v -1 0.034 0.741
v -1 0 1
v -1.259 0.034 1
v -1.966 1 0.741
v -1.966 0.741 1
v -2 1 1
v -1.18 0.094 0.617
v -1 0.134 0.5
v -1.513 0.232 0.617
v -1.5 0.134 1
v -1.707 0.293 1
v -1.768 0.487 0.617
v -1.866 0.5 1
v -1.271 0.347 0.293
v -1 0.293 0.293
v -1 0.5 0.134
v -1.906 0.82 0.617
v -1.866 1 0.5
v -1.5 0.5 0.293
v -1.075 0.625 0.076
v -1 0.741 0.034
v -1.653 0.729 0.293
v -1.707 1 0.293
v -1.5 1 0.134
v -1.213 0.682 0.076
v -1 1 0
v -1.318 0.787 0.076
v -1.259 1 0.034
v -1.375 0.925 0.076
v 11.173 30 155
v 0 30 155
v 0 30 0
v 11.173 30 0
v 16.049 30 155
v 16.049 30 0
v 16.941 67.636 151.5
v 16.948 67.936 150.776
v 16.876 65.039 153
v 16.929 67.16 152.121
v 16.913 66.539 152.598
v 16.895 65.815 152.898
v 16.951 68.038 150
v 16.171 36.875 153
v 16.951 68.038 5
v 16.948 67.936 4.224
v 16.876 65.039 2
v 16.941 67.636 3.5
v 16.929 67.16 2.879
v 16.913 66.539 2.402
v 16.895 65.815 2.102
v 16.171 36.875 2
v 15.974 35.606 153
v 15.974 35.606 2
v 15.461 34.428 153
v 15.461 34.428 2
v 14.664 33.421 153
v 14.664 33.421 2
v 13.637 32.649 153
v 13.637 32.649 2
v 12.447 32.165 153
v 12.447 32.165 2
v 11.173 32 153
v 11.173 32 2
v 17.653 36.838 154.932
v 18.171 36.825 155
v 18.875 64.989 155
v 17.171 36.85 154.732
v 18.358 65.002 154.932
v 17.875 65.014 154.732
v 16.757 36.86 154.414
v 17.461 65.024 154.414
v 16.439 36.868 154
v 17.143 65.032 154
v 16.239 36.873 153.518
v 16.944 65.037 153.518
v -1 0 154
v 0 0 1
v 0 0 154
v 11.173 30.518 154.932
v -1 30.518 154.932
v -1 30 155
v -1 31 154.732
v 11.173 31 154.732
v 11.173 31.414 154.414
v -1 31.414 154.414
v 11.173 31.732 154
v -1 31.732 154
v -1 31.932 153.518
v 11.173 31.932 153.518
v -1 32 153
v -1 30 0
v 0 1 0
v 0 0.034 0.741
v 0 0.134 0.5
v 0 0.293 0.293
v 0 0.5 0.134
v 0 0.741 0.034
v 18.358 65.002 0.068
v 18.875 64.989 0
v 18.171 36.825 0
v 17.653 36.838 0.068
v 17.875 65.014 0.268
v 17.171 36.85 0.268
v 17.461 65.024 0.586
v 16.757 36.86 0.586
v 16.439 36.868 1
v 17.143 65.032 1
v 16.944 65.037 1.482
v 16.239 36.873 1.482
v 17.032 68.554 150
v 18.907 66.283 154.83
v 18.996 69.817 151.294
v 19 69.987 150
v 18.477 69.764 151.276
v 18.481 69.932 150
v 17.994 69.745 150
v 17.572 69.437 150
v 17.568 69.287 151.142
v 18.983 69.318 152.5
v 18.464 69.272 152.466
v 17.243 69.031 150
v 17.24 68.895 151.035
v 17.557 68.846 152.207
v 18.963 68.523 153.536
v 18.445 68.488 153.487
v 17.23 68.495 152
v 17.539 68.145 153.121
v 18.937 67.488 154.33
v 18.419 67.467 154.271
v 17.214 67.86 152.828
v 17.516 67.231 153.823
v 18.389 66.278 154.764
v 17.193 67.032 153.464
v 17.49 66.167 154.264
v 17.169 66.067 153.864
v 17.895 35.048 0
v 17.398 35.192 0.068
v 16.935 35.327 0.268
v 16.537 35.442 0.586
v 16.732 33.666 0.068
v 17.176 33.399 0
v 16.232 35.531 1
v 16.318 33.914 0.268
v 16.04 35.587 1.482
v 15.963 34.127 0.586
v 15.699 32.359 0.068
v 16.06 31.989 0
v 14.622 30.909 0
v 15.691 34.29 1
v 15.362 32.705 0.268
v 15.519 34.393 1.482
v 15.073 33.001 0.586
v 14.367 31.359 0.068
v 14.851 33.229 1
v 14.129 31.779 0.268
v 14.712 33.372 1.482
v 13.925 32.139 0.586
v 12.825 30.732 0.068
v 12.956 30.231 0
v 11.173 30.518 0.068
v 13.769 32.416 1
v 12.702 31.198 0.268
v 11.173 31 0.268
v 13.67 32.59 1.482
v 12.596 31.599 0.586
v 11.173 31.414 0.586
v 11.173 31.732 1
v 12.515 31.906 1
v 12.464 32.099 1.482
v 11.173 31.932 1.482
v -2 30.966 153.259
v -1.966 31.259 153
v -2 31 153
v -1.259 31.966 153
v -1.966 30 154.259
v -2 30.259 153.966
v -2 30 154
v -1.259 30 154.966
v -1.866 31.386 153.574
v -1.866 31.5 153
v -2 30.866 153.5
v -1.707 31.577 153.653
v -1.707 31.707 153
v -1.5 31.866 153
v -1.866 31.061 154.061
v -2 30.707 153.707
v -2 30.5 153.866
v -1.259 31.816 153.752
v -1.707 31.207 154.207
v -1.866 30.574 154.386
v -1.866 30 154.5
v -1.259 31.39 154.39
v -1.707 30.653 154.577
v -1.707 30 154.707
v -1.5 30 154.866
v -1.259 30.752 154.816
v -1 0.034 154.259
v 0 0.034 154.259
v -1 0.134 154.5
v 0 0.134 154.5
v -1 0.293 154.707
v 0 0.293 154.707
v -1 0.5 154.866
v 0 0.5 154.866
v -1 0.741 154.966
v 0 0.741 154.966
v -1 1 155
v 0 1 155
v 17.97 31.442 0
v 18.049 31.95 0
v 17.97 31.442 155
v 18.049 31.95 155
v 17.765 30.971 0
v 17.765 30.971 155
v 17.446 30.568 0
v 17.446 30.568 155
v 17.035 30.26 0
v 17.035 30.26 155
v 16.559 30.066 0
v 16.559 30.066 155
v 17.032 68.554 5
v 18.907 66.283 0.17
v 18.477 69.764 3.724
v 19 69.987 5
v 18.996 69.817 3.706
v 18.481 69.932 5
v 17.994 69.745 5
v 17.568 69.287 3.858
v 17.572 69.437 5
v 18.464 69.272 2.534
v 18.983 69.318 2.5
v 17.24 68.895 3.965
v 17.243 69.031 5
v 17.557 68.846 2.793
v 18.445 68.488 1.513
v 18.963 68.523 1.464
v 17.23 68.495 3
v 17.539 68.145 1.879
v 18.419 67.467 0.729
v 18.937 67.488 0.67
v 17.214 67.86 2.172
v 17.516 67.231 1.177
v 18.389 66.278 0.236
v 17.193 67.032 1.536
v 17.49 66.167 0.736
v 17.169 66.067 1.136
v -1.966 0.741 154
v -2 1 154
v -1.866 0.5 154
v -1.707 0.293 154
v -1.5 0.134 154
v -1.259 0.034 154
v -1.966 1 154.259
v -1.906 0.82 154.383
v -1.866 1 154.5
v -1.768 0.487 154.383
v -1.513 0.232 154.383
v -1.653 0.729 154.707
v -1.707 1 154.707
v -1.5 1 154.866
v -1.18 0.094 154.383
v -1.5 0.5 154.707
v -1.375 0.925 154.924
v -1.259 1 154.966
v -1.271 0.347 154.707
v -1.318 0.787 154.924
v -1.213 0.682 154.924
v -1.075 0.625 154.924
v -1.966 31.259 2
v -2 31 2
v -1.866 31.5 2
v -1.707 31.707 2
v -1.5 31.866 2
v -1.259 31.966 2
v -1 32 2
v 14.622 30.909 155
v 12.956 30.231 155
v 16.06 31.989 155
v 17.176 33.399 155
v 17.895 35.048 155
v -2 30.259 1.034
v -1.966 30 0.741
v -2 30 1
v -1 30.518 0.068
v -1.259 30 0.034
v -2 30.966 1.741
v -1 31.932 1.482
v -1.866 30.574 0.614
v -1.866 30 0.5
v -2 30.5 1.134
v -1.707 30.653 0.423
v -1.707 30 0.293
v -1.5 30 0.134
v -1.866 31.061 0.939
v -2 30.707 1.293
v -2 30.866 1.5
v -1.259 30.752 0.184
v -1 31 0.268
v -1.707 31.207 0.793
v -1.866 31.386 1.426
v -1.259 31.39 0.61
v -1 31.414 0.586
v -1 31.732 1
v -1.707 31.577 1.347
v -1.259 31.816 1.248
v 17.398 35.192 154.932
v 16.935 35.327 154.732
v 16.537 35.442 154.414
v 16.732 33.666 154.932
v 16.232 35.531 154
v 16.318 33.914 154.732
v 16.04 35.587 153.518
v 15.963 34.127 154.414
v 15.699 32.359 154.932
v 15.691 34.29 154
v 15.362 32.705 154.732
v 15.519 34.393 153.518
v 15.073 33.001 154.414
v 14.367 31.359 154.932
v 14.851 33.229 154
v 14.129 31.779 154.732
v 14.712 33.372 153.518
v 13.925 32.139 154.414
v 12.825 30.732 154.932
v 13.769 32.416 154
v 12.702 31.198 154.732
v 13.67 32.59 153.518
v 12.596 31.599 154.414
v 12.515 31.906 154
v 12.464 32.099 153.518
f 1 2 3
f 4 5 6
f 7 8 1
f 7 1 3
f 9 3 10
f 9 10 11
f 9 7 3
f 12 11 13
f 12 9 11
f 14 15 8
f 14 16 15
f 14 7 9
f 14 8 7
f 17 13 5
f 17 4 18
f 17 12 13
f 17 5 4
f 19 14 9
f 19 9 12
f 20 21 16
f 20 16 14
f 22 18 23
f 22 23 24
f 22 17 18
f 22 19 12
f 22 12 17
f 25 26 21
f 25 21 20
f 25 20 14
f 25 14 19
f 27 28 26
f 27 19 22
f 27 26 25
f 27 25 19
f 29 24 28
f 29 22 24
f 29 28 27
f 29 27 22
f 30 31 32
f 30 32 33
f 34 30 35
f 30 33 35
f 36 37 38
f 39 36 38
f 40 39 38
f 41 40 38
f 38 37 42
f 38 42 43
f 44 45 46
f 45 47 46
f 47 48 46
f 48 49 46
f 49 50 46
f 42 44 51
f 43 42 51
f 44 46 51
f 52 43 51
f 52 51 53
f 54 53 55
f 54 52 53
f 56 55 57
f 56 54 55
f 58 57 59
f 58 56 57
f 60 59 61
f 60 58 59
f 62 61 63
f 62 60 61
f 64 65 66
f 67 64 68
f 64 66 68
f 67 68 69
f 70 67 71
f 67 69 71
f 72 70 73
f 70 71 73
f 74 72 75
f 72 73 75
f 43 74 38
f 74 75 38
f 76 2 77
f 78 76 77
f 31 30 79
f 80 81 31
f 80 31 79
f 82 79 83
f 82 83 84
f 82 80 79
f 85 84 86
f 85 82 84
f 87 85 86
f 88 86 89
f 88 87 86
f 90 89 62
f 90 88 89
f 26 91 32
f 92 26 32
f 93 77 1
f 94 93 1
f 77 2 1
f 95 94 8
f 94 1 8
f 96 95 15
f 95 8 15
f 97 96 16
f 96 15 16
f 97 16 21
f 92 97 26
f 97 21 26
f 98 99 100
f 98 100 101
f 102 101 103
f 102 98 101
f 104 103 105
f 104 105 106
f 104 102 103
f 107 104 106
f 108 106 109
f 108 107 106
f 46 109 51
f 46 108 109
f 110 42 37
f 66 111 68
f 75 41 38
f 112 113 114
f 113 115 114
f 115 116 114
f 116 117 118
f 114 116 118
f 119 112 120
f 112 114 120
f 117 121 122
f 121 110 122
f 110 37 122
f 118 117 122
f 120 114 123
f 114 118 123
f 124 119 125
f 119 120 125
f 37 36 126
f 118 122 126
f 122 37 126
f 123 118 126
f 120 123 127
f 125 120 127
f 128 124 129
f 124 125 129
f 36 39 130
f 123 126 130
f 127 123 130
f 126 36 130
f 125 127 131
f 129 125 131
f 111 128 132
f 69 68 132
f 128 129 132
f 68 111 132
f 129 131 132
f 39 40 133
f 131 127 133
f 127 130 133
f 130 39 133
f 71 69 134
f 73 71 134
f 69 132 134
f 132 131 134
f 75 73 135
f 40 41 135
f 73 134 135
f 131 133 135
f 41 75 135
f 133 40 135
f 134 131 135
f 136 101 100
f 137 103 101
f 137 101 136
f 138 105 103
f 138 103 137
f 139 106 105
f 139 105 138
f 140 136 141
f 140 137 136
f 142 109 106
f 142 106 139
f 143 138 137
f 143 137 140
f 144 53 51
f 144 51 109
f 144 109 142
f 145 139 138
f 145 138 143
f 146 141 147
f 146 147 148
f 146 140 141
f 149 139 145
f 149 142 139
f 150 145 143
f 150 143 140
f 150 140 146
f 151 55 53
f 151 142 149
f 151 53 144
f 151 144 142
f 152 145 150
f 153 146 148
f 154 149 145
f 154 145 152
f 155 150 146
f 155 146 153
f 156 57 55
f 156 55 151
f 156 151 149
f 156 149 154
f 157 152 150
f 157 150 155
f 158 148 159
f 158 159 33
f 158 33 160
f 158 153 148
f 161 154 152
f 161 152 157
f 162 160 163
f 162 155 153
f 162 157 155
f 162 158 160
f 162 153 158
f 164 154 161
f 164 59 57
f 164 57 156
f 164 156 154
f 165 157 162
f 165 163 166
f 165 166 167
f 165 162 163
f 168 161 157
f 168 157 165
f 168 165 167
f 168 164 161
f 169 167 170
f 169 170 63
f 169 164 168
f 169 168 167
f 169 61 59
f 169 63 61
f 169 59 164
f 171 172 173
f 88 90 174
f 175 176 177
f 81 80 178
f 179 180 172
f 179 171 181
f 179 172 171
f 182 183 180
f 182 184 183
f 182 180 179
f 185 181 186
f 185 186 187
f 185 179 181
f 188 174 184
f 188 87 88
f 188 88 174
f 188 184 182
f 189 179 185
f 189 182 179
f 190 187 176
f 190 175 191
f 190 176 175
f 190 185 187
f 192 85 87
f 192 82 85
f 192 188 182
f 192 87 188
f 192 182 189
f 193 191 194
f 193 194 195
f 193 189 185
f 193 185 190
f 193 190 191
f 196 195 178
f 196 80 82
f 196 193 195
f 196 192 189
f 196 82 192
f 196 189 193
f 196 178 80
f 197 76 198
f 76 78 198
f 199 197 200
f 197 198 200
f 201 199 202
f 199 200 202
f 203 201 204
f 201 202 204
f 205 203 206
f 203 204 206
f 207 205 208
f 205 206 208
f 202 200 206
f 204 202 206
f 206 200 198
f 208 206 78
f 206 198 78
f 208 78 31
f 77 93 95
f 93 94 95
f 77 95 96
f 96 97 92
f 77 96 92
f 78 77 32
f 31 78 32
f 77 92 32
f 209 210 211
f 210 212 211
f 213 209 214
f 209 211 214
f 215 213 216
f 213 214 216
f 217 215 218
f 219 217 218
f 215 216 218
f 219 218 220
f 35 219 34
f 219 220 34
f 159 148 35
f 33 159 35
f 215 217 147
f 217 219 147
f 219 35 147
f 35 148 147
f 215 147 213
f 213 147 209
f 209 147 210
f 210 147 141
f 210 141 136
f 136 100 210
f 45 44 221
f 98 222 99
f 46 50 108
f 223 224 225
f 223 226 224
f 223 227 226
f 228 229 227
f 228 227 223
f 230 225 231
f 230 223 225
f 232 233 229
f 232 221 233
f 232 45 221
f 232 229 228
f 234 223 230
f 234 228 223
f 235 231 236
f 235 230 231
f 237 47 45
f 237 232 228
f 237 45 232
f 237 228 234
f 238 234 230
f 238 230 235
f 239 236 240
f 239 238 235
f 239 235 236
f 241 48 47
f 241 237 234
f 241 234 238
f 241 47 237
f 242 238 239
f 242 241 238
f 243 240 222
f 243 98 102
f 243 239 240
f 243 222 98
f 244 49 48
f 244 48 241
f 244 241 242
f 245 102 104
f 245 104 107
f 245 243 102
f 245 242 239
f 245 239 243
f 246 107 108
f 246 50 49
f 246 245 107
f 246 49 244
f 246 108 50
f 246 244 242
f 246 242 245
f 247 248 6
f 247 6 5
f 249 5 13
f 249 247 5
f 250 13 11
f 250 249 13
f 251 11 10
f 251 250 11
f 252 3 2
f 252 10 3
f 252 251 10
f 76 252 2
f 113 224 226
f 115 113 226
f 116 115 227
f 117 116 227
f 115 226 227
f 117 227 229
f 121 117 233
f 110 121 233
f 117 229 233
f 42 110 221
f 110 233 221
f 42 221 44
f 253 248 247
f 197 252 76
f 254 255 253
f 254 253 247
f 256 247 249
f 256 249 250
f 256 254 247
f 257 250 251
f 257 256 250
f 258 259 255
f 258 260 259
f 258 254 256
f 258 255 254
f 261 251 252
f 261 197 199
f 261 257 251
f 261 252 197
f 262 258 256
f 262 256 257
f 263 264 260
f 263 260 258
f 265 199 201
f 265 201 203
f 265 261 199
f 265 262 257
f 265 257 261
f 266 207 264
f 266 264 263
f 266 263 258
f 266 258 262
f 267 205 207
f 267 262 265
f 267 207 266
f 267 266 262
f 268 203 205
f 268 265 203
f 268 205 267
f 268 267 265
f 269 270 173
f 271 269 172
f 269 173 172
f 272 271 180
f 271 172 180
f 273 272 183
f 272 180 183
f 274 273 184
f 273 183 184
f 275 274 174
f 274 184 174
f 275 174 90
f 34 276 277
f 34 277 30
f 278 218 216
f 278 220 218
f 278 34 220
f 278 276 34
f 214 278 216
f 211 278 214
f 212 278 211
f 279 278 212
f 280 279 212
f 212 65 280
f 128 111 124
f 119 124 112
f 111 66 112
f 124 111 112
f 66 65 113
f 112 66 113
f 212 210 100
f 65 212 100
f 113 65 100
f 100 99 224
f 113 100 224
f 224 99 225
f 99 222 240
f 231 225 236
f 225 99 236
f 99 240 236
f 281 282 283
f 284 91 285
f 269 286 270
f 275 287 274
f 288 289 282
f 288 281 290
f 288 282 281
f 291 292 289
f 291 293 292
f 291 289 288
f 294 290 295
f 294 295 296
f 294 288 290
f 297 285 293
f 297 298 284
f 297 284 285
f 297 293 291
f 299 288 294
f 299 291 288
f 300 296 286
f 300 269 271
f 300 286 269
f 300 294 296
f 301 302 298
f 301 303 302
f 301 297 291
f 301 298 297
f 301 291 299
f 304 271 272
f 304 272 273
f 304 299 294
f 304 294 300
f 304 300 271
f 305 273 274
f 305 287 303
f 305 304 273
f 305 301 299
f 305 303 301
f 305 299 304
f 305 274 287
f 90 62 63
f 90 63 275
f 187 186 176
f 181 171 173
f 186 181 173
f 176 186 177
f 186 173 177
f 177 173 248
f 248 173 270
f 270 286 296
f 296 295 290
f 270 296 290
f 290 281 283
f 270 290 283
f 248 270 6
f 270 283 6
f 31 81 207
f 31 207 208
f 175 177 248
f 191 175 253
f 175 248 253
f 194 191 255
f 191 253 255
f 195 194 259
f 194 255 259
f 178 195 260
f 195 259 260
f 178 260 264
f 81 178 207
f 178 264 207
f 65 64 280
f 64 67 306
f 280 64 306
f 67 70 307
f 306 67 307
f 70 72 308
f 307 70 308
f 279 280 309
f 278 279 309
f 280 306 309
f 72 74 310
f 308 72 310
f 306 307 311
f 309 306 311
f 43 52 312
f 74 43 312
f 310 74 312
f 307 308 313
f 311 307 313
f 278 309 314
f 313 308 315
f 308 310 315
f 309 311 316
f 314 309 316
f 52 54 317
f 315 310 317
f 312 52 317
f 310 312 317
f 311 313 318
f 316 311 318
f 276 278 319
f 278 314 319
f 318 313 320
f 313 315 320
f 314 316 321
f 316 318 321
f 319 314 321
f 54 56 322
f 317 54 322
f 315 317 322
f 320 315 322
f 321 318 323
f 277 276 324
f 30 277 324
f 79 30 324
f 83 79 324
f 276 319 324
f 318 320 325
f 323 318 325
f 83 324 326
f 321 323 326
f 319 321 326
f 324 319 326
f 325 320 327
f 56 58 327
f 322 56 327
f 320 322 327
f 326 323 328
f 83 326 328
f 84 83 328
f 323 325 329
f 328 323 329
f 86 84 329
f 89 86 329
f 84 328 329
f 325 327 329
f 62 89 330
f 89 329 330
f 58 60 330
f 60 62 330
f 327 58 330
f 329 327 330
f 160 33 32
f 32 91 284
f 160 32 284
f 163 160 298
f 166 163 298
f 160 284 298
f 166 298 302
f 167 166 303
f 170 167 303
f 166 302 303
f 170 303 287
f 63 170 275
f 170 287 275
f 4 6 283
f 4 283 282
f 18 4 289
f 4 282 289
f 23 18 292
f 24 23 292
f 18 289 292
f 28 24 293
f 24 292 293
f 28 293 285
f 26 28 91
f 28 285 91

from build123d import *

# Parameters (mm, degrees)
F1_DEPTH     = 155
F2_R         = 5
F3_T1_DEPTH  = 145
F3_T3_DEPTH  = 28.172866076
F3_T5_DEPTH  = 18.1728662684
F3_T8_ANGLE  = 90
F3_T10_ANGLE = 90
F3_T12_ANGLE = 88.5674563985
F3_T14_ANGLE = 88.5674563985
F4_R         = 2
F5_R         = 1
F6_R         = 1


# Not quite as in the source:
# - a fillet or chamfer that OpenCascade refuses, or shapes differently, is made with other operations: its cross-section is extruded or revolved along the edge and cut away or added


with BuildPart() as f1:
    # F0 (on Top) → F1 (new body)
    with BuildSketch(Plane.XY):
        Polygon((-2.000000095, 0), (0, 0), (0, 30), (18, 30), (18.999999905, 69.9874980486), (17.0006250026, 70.0374980439), (16.0493903369, 32.000000095), (-2.000000095, 32.000000095), align=None)
    extrude(amount=F1_DEPTH)

    # F2
    f2_edges = [f1.edges().sort_by_distance(p)[0] for p in [
        (16.04939, 32, 77.5),
        (18.000312, 70.012498, 155),
        (18.000312, 70.012498, 0),
    ]]
    fillet(f2_edges, radius=F2_R)

    # F3: fillet of radius 2 on 6 edges, made by hand

    # F3_s2 → F3_t1 (cut)
    with BuildSketch(Plane.XY.offset(5)):
        with BuildLine():
            ThreePointArc((18.999999905, 69.9874980486), (17.5715836938, 69.4372500336), (16.9506250073, 68.0381231415))
            Line((16.9506250073, 68.0381231415), (17.0006250026, 70.0374980439))
            Line((17.0006250026, 70.0374980439), (18.999999905, 69.9874980486))
        make_face()
    extrude(amount=F3_T1_DEPTH, mode=Mode.SUBTRACT)

    # F3_s4 → F3_t3 (cut)
    with BuildSketch(Plane(origin=(1.6360154319, 65.4201701064, 0), x_dir=(0, 0, 1), z_dir=(-0.0249999976, -0.9996874512, 0))):
        with BuildLine():
            ThreePointArc((0, -17.2443741931), (0.5857864376, -15.8301606308), (2, -15.2443741931))
            Line((2, -15.2443741931), (0, -15.2443741931))
            Line((0, -15.2443741931), (0, -17.2443741931))
        make_face()
        with BuildLine():
            ThreePointArc((155, -17.2443741931), (154.4142135624, -15.8301606308), (153, -15.2443741931))
            Line((153, -15.2443741931), (155, -15.2443741931))
            Line((155, -15.2443741931), (155, -17.2443741931))
        make_face()
    extrude(amount=F3_T3_DEPTH, mode=Mode.SUBTRACT)

    # F3_s6 → F3_t5 (cut)
    with BuildSketch(Plane.YZ.offset(-7.000000095)):
        with BuildLine():
            ThreePointArc((30.000000095, 155), (31.4142136574, 154.4142135624), (32.000000095, 153))
            Line((32.000000095, 153), (32.000000095, 155))
            Line((32.000000095, 155), (30.000000095, 155))
        make_face()
        with BuildLine():
            ThreePointArc((30.000000095, 0), (31.4142136574, 0.5857864376), (32.000000095, 2))
            Line((32.000000095, 2), (32.000000095, 0))
            Line((32.000000095, 0), (30.000000095, 0))
        make_face()
    extrude(amount=F3_T5_DEPTH, mode=Mode.SUBTRACT)

    # F3_s7 → F3_t8 (revolve, cut)
    with BuildSketch(Plane.XY.offset(5)):
        with BuildLine():
            ThreePointArc((18.999999905, 69.9874980486), (17.5715836938, 69.4372500336), (16.9506250073, 68.0381231415))
            Line((16.9506250073, 68.0381231415), (17.0006250026, 70.0374980439))
            Line((17.0006250026, 70.0374980439), (18.999999905, 69.9874980486))
        make_face()
    revolve(axis=Axis((16.8756250144, 65.0390607878, 5), (-0.9996874512, 0.0249999976, 0)), revolution_arc=F3_T8_ANGLE, mode=Mode.SUBTRACT)

    # F3_s9 → F3_t10 (revolve, cut)
    with BuildSketch(Plane.XY.offset(150)):
        with BuildLine():
            ThreePointArc((18.999999905, 69.9874980486), (17.5715836938, 69.4372500336), (16.9506250073, 68.0381231415))
            Line((16.9506250073, 68.0381231415), (17.0006250026, 70.0374980439))
            Line((17.0006250026, 70.0374980439), (18.999999905, 69.9874980486))
        make_face()
    revolve(axis=Axis((16.8756250144, 65.0390607878, 150), (0.9996874512, -0.0249999976, 0)), revolution_arc=F3_T10_ANGLE, mode=Mode.SUBTRACT)

    # F3_s11 → F3_t12 (revolve, cut)
    with BuildSketch(Plane(origin=(0.9316938469, 37.2561094255, 0), x_dir=(0, 0, 1), z_dir=(0.0249999976, 0.9996874512, 0))):
        with BuildLine():
            ThreePointArc((155, 17.2443741931), (154.4142135624, 15.8301606308), (153, 15.2443741931))
            Line((153, 15.2443741931), (155, 15.2443741931))
            Line((155, 15.2443741931), (155, 17.2443741931))
        make_face()
    revolve(axis=Axis((11.1728661734, 37.000000095, 155), (0, 0, -1)), revolution_arc=F3_T12_ANGLE, mode=Mode.SUBTRACT)

    # F3_s13 → F3_t14 (revolve, cut)
    with BuildSketch(Plane(origin=(0.9316938469, 37.2561094255, 0), x_dir=(0, 0, 1), z_dir=(0.0249999976, 0.9996874512, 0))):
        with BuildLine():
            ThreePointArc((0, 17.2443741931), (0.5857864376, 15.8301606308), (2, 15.2443741931))
            Line((2, 15.2443741931), (0, 15.2443741931))
            Line((0, 15.2443741931), (0, 17.2443741931))
        make_face()
    revolve(axis=Axis((11.1728661734, 37.000000095, 0), (0, 0, -1)), revolution_arc=F3_T14_ANGLE, mode=Mode.SUBTRACT)

    # F4
    f4_edges = [f1.edges().sort_by_distance(p)[0] for p in [
        (18, 30, 77.5),
    ]]
    fillet(f4_edges, radius=F4_R)

    # F5
    f5_edges = [f1.edges().sort_by_distance(p)[0] for p in [
        (-2, 0, 77.5),
    ]]
    fillet(f5_edges, radius=F5_R)

    # F6
    f6_edges = [f1.edges().sort_by_distance(p)[0] for p in [
        (-2, 32, 77.5),
        (-0.5, 0, 0),
        (-1.707107, 0.292893, 0),
        (-2, 15.5, 0),
        (-0.5, 0, 155),
        (-1.707107, 0.292893, 155),
        (-2, 31.414214, 0.585786),
        (-2, 15.5, 155),
        (-2, 31.414214, 154.414214),
    ]]
    fillet(f6_edges, radius=F6_R)


solid = f1.part
